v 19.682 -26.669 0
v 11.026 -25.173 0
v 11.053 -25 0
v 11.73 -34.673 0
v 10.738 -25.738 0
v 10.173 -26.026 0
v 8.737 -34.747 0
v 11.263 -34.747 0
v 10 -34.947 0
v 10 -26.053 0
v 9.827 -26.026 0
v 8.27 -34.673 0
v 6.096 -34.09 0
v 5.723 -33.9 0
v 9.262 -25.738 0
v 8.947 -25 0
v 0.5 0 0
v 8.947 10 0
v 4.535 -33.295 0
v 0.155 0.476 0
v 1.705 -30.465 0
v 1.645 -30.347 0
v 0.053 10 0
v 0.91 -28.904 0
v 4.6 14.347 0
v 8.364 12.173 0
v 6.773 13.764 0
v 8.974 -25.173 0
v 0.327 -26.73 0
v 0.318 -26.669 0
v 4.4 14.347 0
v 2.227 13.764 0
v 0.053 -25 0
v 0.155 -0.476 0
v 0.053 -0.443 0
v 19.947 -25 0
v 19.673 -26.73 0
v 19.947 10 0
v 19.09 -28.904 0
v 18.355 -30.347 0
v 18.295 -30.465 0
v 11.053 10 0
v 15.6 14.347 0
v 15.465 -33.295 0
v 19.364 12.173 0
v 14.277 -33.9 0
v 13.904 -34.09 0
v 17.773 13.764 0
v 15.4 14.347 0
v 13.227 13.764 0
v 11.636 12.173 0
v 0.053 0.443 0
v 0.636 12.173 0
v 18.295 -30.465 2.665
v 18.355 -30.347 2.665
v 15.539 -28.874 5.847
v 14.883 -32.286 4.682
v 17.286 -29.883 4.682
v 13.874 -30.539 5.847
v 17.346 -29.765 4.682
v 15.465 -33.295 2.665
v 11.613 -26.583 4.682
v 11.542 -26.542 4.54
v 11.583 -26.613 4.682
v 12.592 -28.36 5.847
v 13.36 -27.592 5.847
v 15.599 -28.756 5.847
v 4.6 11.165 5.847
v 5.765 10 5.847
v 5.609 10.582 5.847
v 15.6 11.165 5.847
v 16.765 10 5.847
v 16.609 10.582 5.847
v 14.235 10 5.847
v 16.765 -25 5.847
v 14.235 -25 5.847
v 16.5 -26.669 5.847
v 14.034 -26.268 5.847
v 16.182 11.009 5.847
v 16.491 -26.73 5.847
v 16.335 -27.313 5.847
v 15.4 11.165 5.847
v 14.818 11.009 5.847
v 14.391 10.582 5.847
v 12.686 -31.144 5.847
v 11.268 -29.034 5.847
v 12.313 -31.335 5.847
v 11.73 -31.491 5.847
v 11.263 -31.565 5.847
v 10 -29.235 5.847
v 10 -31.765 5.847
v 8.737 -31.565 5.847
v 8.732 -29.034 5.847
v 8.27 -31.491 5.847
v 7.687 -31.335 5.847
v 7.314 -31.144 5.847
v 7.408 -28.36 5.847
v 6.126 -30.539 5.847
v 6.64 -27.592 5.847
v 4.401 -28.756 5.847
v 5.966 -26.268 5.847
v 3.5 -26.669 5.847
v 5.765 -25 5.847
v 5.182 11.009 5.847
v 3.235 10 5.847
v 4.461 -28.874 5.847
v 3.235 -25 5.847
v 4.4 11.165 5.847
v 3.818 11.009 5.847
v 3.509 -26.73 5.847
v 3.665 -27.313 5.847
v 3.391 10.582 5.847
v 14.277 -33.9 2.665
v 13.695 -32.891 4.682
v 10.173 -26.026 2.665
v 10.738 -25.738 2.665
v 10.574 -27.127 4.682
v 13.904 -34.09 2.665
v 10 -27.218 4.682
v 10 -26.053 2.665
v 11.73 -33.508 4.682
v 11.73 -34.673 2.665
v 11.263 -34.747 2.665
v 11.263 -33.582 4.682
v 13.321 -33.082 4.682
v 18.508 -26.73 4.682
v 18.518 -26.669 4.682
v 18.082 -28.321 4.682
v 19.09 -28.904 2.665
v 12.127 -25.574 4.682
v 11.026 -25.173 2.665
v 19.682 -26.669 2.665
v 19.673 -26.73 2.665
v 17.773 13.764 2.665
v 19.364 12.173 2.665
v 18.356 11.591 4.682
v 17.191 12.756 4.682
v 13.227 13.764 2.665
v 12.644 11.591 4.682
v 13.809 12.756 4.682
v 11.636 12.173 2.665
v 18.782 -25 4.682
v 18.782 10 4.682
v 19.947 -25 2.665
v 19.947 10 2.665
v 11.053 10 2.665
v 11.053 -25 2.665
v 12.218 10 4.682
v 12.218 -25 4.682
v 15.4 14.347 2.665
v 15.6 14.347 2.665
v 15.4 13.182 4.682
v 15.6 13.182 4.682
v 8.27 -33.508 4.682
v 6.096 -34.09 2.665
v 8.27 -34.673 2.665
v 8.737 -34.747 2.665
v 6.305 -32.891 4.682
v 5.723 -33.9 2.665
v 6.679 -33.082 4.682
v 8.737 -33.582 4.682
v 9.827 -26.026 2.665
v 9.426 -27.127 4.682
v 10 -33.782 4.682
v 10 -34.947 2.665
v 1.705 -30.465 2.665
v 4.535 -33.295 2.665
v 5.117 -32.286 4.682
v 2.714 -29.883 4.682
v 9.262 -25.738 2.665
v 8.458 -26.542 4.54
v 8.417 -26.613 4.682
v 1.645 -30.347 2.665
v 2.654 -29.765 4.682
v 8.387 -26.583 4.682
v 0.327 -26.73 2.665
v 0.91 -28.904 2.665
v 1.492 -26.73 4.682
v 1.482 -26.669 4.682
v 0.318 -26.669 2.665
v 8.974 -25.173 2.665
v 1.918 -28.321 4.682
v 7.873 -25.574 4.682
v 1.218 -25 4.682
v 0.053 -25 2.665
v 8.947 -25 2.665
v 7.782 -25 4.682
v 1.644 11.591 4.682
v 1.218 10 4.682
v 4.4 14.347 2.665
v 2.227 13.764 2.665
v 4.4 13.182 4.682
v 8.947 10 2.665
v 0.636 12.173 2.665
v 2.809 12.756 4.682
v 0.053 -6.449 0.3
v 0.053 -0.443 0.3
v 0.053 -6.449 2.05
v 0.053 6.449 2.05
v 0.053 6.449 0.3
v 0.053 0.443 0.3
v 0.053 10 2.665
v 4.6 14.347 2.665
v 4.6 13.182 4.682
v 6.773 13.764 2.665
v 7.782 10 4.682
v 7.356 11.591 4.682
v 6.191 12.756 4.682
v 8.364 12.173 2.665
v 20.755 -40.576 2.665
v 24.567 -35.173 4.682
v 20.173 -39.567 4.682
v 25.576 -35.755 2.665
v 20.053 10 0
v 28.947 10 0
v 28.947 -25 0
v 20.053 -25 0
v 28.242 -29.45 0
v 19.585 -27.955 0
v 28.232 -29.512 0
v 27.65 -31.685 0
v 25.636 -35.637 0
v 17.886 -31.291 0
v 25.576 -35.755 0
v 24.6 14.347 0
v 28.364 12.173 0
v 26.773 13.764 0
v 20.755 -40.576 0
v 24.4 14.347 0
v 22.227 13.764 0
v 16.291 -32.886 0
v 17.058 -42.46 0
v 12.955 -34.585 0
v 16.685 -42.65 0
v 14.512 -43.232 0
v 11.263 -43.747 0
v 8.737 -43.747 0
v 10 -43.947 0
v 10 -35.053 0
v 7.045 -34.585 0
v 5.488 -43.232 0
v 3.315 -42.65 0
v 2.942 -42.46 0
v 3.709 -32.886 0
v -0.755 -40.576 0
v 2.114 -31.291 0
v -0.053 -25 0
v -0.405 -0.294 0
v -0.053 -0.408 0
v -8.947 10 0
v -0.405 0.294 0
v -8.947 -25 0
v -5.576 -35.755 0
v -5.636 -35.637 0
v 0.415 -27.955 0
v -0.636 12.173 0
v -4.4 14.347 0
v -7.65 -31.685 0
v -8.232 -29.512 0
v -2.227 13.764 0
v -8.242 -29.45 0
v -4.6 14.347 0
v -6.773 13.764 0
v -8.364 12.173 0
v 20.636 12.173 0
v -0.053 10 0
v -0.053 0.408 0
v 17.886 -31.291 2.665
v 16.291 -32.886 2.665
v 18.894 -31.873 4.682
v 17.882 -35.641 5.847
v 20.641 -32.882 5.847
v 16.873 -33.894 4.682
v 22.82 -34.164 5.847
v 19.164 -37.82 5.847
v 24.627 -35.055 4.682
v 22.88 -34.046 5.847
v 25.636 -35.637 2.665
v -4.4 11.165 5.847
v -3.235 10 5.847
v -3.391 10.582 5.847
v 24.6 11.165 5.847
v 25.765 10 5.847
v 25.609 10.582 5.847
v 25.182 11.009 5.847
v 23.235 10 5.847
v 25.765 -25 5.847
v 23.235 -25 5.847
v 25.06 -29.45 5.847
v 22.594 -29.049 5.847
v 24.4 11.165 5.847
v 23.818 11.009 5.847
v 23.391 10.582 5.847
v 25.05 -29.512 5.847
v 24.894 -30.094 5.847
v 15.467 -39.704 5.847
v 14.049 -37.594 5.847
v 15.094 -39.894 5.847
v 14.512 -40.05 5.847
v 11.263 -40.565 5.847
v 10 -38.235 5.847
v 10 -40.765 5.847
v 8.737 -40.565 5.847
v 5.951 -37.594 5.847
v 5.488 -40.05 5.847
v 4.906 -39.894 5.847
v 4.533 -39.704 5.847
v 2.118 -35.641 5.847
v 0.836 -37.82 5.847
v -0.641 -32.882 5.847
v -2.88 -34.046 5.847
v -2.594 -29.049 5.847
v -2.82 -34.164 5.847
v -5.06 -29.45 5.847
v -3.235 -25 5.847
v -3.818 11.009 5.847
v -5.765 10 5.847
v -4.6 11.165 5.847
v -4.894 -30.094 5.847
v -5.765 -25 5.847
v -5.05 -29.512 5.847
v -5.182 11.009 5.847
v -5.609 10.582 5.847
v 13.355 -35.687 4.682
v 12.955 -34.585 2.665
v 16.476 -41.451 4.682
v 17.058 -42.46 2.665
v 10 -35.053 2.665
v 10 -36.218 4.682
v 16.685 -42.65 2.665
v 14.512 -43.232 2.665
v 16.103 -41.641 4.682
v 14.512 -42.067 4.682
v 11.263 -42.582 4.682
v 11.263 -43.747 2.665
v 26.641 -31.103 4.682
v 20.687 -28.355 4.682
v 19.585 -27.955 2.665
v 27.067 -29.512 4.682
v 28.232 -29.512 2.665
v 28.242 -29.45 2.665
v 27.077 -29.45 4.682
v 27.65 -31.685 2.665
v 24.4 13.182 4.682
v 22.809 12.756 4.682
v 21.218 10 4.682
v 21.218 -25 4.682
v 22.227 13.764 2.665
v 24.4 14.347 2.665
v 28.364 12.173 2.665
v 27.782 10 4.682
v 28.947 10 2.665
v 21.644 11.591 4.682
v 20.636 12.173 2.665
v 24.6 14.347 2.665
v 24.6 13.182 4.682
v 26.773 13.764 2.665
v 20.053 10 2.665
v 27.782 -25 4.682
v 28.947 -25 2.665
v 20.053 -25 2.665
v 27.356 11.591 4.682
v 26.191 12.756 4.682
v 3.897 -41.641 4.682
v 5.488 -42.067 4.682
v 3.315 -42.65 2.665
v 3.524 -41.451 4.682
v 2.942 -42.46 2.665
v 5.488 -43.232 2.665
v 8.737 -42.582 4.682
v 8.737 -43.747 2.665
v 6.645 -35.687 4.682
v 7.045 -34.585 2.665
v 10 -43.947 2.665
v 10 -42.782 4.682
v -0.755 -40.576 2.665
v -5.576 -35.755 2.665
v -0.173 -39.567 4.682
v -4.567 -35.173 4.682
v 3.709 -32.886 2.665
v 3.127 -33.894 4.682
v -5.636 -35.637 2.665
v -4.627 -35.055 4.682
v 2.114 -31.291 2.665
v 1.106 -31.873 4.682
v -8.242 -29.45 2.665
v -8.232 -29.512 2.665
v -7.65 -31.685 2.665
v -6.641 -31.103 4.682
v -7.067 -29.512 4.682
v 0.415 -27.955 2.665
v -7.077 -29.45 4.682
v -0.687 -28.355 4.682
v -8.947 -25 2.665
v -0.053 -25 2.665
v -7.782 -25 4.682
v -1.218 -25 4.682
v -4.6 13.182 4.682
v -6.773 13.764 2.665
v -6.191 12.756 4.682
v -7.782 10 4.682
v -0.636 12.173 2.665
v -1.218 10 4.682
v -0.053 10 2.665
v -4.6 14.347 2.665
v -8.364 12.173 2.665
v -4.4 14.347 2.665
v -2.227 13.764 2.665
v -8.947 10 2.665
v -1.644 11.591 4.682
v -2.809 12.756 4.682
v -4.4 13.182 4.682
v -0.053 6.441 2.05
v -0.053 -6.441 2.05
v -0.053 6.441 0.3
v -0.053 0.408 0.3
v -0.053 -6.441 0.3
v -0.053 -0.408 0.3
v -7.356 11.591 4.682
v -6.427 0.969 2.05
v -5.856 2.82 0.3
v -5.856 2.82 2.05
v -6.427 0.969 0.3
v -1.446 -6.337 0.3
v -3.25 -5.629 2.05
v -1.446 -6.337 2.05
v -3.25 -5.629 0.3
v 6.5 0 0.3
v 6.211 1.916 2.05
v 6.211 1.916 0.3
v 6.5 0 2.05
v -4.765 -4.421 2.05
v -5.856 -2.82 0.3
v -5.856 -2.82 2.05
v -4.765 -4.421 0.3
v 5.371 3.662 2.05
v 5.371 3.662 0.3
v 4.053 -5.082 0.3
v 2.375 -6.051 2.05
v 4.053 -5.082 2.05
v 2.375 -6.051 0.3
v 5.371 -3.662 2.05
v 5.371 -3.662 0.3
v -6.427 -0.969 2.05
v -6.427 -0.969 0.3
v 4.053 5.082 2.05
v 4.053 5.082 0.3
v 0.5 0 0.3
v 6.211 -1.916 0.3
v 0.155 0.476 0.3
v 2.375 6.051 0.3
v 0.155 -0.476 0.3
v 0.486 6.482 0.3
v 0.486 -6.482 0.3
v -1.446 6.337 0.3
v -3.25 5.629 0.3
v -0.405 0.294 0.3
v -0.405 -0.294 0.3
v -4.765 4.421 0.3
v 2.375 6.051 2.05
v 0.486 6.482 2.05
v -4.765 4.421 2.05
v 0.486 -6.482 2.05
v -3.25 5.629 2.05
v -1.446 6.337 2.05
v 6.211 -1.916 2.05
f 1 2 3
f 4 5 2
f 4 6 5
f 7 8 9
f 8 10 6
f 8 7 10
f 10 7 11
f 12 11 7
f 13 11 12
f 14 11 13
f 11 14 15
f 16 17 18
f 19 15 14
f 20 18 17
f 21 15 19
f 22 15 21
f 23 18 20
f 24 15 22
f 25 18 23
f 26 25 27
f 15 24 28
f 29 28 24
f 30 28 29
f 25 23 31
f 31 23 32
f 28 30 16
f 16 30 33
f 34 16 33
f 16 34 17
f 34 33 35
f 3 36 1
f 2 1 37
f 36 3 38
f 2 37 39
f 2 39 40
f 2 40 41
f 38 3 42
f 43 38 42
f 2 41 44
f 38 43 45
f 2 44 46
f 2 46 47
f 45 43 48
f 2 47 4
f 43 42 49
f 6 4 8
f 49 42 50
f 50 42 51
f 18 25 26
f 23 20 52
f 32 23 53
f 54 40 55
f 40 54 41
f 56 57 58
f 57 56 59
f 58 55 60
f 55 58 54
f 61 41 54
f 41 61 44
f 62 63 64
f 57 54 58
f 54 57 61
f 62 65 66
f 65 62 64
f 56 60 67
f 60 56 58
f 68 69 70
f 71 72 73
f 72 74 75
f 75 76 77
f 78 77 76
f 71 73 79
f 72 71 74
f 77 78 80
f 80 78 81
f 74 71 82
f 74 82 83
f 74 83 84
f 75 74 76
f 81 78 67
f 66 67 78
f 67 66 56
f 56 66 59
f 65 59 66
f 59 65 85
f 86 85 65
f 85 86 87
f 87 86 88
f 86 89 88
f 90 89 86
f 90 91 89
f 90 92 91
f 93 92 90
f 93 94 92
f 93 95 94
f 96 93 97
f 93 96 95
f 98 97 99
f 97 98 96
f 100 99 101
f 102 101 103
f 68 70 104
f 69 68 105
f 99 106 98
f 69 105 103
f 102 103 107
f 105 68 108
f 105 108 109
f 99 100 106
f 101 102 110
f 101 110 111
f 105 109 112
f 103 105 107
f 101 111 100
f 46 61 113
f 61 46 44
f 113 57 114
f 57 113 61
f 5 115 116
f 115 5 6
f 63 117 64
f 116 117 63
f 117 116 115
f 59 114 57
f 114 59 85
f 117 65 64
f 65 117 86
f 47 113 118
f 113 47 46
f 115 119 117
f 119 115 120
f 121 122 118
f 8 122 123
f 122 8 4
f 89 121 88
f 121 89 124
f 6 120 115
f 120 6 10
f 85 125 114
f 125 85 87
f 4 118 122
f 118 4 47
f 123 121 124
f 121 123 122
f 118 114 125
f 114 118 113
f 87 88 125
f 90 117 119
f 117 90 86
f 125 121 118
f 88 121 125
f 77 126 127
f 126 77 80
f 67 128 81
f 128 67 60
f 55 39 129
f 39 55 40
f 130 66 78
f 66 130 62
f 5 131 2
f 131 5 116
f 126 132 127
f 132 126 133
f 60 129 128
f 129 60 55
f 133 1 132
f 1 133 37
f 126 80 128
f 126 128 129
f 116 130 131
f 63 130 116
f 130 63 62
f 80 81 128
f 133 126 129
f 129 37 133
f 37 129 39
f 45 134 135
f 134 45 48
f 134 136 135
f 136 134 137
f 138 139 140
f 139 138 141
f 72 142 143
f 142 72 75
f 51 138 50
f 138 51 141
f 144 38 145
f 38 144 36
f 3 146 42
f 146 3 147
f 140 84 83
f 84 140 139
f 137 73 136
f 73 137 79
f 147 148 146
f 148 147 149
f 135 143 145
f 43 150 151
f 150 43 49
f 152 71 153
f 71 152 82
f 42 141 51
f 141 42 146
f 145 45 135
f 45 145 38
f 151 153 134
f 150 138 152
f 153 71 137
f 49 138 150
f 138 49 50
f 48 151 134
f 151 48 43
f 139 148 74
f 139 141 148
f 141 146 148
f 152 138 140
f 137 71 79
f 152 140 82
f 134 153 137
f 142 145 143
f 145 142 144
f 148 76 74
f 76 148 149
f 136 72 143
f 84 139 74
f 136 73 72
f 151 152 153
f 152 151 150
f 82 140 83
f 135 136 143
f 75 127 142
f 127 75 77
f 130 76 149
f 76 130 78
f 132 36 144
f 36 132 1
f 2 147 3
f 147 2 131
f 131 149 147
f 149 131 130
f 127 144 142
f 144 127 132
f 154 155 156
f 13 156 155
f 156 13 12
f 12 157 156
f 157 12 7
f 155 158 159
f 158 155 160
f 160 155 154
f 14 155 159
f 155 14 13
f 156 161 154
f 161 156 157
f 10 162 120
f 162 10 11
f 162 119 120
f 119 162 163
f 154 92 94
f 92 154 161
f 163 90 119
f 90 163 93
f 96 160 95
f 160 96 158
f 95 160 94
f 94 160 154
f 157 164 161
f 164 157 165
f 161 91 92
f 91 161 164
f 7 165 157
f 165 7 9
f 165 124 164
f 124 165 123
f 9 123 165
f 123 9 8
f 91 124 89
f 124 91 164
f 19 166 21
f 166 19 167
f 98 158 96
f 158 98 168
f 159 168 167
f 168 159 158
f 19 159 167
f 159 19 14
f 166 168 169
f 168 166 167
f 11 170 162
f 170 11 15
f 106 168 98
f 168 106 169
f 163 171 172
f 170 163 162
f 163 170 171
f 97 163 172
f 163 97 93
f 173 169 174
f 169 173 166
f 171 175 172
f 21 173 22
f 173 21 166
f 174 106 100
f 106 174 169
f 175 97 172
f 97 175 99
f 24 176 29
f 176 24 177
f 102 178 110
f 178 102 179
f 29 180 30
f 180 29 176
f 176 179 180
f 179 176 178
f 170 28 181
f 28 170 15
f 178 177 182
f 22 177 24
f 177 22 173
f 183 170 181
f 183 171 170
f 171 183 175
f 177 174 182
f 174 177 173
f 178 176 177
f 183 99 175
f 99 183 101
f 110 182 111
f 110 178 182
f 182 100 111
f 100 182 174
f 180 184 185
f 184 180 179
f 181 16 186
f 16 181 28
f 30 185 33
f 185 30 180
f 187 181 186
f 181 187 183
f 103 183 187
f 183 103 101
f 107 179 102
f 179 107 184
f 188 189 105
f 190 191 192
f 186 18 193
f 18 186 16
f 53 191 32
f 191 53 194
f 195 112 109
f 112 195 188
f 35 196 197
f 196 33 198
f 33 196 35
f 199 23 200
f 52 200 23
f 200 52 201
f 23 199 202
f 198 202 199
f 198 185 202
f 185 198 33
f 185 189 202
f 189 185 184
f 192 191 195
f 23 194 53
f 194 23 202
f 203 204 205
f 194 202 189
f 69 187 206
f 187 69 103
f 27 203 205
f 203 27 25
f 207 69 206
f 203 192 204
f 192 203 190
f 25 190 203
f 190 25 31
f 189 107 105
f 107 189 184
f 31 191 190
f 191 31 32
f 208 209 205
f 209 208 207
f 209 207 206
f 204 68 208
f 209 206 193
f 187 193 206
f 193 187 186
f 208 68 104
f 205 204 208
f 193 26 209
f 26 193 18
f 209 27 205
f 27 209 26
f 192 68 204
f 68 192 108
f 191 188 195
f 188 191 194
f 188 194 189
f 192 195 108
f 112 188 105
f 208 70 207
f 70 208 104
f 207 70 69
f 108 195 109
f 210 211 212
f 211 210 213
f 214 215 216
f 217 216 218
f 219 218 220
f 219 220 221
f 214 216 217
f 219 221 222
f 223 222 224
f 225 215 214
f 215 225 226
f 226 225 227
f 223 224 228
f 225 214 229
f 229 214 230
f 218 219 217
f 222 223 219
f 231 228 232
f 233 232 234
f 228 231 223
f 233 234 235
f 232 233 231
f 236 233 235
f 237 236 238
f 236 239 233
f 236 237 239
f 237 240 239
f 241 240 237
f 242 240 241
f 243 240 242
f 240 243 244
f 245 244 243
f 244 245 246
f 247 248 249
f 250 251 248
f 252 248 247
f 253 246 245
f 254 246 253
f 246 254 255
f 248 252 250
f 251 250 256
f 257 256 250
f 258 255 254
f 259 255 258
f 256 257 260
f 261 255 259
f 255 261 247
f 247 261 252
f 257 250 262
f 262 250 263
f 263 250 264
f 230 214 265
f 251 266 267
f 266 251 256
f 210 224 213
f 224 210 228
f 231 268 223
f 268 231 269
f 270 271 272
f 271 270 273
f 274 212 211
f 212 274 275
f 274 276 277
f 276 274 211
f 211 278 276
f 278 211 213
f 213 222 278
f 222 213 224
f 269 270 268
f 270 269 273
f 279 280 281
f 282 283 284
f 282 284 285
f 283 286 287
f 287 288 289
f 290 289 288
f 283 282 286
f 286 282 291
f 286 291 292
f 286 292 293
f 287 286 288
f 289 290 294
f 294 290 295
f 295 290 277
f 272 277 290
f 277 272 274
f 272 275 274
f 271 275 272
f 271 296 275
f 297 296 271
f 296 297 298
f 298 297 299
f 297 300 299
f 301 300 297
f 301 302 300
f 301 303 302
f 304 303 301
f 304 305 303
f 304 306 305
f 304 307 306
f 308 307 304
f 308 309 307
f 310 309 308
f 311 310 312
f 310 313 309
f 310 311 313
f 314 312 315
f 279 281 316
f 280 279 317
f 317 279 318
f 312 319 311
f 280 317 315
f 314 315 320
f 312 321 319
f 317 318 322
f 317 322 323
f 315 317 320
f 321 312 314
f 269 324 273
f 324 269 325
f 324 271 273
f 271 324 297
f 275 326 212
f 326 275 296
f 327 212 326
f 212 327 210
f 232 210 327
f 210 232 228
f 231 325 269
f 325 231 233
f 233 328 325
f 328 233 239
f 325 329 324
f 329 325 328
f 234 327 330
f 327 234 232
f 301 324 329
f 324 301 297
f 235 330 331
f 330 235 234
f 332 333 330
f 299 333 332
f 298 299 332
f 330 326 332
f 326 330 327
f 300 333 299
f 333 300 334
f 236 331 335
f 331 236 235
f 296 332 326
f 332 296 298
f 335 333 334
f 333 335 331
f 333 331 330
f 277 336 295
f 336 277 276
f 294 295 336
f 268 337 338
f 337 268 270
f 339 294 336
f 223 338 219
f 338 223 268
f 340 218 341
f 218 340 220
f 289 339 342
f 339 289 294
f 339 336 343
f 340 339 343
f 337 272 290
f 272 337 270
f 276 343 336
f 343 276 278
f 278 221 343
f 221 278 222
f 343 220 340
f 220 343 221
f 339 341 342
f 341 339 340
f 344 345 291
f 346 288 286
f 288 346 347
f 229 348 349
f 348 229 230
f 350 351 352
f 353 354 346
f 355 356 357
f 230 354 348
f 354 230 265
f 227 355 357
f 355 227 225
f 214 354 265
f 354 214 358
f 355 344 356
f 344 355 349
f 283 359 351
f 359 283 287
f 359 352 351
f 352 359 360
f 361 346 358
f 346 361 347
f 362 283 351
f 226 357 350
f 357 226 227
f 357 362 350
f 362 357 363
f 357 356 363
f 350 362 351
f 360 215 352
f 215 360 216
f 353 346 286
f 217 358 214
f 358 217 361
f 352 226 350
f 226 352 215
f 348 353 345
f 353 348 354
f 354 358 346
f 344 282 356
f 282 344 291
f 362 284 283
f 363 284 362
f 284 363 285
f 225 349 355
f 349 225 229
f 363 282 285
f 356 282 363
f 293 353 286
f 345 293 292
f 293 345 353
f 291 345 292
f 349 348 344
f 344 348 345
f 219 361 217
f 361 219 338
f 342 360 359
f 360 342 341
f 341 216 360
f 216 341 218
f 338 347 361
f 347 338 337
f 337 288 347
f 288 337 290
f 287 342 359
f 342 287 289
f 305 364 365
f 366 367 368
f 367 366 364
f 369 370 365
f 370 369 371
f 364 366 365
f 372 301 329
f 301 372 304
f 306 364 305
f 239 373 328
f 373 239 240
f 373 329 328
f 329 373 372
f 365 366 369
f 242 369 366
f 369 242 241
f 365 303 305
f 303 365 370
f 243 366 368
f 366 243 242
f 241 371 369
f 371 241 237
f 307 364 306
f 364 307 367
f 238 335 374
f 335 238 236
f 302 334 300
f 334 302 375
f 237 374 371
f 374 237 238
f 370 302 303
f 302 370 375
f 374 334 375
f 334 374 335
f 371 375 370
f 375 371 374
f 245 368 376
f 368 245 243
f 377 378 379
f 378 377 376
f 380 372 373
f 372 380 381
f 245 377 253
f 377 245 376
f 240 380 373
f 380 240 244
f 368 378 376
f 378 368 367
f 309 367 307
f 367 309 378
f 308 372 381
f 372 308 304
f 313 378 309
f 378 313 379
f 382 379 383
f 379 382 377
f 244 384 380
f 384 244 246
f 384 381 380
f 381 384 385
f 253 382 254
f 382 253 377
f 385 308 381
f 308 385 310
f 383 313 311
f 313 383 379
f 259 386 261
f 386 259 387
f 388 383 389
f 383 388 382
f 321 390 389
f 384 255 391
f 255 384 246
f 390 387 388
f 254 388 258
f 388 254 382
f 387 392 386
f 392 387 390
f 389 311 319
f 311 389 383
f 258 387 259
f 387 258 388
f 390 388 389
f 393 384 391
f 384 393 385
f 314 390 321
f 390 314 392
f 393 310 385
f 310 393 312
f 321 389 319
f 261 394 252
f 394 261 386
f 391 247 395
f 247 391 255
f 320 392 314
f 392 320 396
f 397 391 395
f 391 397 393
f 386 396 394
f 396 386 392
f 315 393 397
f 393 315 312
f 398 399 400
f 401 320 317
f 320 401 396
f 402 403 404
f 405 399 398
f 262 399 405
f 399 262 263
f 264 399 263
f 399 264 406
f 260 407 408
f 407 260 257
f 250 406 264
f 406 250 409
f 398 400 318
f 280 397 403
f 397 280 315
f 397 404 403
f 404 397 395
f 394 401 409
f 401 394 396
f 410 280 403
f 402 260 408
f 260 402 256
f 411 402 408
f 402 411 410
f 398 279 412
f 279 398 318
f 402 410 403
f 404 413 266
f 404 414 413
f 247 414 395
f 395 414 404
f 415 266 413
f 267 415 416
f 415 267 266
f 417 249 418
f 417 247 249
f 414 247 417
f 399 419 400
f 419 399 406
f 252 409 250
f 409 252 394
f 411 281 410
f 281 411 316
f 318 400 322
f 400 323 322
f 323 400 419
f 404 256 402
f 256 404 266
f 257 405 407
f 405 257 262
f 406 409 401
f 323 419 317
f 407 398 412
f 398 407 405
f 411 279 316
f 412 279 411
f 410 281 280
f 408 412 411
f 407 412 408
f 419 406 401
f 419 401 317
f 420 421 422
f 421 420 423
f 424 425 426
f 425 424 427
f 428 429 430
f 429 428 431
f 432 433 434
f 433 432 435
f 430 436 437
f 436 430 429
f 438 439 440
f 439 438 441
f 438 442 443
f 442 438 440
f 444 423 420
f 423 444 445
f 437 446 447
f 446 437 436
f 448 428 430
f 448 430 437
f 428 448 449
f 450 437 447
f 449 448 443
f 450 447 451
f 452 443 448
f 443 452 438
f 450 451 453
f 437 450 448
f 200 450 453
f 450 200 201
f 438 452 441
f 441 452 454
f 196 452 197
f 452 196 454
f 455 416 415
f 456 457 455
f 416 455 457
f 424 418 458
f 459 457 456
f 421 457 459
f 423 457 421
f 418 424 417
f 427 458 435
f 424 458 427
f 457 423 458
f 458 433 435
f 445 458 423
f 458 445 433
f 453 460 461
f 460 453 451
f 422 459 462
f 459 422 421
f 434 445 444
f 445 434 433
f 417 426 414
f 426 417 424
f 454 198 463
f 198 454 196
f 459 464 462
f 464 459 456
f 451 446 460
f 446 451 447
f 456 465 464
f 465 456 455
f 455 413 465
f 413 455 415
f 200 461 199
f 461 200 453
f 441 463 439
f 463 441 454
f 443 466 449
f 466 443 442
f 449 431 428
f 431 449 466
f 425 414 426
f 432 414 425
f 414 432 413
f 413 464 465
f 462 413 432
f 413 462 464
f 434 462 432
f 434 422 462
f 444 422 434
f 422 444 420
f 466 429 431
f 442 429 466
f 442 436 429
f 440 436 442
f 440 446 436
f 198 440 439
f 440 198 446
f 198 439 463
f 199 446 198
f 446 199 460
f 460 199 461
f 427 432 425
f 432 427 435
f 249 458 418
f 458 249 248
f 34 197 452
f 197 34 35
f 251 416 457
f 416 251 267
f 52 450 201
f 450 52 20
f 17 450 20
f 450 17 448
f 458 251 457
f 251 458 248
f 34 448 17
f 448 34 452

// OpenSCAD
tall = 35; // how tall of a U

// primitive 2D U-shape
module yoo(r) {
	union() {
		circle(r=r,$fn=20);
		translate([-r,0,0])
			square([2*r,tall]);
	}
}

// hemisphere to minkowski with
module hemisphere(r) {
	difference() {
		sphere(r=r,$fn=12);
		translate([-r,-r,-2*r]) cube([2*r,2*r,2*r]);
	}
}

// dome of a U-shape
module dome(gap, thick, pad = 0) {
	minkowski() {
		linear_extrude(height=1.5) difference() {
			yoo(r=(gap + thick - (thick/2) + 0.1));
			yoo(r=(gap + thick - (thick/2) - 0.1));
		}
		hemisphere(r=(thick/2 - pad));
	}
}

// complete single U-shape
module bar(gap,thick) {
	dome(gap=gap, thick=thick);
}

// two U-shapes together
module du(thick, gap) {
	for (i=[0,1]) {
		bar(gap=(gap + thick*i), thick=thick);
	}
}

difference() {
	translate([10,-25,0]) du(thick=9, gap=1);

	// magnet hole
	translate([0,0,0.3])  cylinder(1.75,6.5,6.5);
	translate([0,0,-0.1]) cylinder(1.75,0.5,0.5);
}
